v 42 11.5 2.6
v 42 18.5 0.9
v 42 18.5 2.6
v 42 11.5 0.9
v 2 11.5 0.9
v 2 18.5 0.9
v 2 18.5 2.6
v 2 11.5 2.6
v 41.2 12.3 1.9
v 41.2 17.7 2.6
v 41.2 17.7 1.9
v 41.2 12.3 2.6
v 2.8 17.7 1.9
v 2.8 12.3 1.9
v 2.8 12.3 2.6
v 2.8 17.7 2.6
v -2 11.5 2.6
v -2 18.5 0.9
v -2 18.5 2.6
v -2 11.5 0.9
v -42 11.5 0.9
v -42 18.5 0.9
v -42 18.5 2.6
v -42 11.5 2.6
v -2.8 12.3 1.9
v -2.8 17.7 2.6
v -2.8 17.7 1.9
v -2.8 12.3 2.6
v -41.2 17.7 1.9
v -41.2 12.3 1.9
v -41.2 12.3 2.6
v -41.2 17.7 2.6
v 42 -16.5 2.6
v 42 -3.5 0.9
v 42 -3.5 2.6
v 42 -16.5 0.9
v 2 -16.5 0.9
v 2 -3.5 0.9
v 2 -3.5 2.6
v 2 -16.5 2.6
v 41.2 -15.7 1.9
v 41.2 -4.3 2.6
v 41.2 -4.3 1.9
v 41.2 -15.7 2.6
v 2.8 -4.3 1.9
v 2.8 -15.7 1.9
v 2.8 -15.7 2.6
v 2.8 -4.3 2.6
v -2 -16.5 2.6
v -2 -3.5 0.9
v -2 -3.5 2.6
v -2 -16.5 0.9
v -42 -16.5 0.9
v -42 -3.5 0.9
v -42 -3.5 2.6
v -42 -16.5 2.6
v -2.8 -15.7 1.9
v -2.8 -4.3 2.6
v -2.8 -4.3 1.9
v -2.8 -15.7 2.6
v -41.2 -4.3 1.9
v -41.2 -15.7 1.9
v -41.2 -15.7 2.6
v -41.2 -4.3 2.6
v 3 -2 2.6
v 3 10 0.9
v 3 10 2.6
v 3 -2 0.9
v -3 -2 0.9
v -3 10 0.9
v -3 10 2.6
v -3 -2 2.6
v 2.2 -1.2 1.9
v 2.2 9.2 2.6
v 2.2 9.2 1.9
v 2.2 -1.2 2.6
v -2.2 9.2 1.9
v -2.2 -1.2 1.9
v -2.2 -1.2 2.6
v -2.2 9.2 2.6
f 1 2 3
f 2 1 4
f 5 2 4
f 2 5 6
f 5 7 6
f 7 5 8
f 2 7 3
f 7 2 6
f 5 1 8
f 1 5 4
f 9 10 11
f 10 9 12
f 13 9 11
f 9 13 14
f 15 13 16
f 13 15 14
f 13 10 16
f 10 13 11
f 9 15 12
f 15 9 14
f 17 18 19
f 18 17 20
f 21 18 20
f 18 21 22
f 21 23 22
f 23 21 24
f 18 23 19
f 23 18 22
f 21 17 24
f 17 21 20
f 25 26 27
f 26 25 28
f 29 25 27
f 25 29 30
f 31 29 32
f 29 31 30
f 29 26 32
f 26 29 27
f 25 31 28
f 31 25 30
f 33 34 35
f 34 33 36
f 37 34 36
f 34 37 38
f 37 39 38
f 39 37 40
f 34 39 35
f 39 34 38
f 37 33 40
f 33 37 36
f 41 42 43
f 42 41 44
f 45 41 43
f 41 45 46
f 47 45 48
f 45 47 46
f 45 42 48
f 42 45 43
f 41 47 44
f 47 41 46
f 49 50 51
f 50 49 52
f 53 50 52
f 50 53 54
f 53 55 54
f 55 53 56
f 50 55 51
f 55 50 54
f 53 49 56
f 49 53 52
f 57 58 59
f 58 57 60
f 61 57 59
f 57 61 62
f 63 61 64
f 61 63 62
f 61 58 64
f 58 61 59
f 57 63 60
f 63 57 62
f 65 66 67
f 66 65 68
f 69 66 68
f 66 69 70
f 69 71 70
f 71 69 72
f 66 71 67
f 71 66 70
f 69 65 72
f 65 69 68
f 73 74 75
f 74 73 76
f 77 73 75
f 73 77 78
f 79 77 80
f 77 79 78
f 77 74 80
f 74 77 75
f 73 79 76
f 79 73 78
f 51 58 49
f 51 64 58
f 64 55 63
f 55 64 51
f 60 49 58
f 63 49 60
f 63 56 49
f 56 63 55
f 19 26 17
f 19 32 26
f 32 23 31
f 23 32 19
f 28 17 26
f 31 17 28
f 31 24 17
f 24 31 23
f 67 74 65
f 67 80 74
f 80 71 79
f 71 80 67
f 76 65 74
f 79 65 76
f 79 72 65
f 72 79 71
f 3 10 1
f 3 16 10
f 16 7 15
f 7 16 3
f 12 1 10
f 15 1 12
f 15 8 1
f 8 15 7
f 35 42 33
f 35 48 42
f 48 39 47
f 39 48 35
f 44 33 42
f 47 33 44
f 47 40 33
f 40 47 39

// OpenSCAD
baseLength = 90;
baseWidth = 65;
baseHeight = 2.6;
baseCorner = 1;
figureStandHeight = 1;
grassHeight = 0.7;

sabotLength = 60;
sabotWidth = 40;
sabotHeight = 2.2;

sabotTolerance = 0.5;
diceSize = 8;

module noise() {
    scale([1.0 / 100.0, 1.0 / 100.0, 1.0 / 100.0]) surface(file = "Noise.png", center = true, invert = false);
};

module firepower() {
    scale([1.0 / 100.0, 1.0 / 100.0, 1.0 / 100.0]) surface(file = "Firepower.png", center = true, invert = false);
};

module baseShape(length = baseLength, width = baseWidth, height = baseHeight) {
    union() {
            
        translate([0, 0, height / 2]) cube([length, width, height], center = true);
        translate([0, 0, height]) scale([length, width, grassHeight]) noise();
    };

};

module cylindricalRect(length = baseLength, width = baseWidth, height = 1, cornerRadius = baseCorner) {

    cx = length / 2 - cornerRadius;
    cy = width / 2 - cornerRadius;
    cl = length - 2 * cornerRadius;
    cw = width - 2 * cornerRadius;
    
    scale([1, 1, 1]) union() {
        translate([cx, cy, 0]) cylinder(h = height, r = cornerRadius, $fn = 72);
        translate([-cx, cy, 0]) cylinder(h = height, r = cornerRadius, $fn = 72);
        translate([cx, -cy, 0]) cylinder(h = height, r = cornerRadius, $fn = 72);
        translate([-cx, -cy, 0]) cylinder(h = height, r = cornerRadius, $fn = 72);
        translate([0, 0, height / 2]) cube([length, 2 * cy, height], center = true);
        translate([0, 0, height / 2]) cube([2 * cx, width, height], center = true);
    };
};

module infoBar() {
    // Info bar
    infoOffY = 1 - (baseWidth - diceSize) / 2;
    infoLength = baseLength - 15 - diceSize;
    
    translate([-6 + (baseLength - infoLength) / 2, infoOffY, baseHeight - 1]) sabot(length = infoLength, width = diceSize, cutout = true);
    
    // Dice
    translate([6 - (baseLength - diceSize) / 2, infoOffY, 1]) sabot(length = diceSize, width = diceSize, cutout = true);
};

module sabot(length = sabotLength, width = sabotWidth, height = 2 * sabotHeight, cutout = false, filled = false) {

	if (cutout) {
		tolerance = sabotTolerance;
		translate([0, 0, height / 2]) cube([length + tolerance, width + tolerance, height], center = true);
	} else {
        border = 0.8;

		translate([0, 0, height / 2]) difference() {
    		cube([length, width, height], center = true);

    		if (!filled) {
            	translate([0, 0, 1]) cube([length - 2 * border, width - 2 * border, height], center = true);
            };
    	};
    };
};

module sabotsFrenchInfantryWithArty(tolerance = 0, cutouts = true) {
            
    skirmishLineY = 21;
    mainLineY = 3.5;
    commanderLineY = -15;
    
    difference() {
        union() {

            if (cutouts) {
                sabot(length = 80, width = 20, offX = 0, offY = mainLineY, tolerance = tolerance);
            } else {
                // Infantry
                sabot(length = 30, width = 20, offX = 30, offY = mainLineY, tolerance = tolerance);
                sabot(length = 30, width = 20, offX = -30, offY = mainLineY, tolerance = tolerance);
            
                // Artillery
                sabot(length = 20, width = 20, offX = 0, offY = mainLineY, tolerance = tolerance);
            };
            
            // Skirmishers
            sabot(length = 30, width = 9, offX = 25, offY = skirmishLineY, tolerance = tolerance);
            sabot(length = 30, width = 9, offX = -25, offY = skirmishLineY, tolerance = tolerance);
            
            // Commander
            sabot(length = 10, width = 12, offX = 0, offY = commanderLineY, tolerance = tolerance);
            
            if (cutouts) {
                infoBar(tolerance = tolerance);
            };
        };
        
        if (!cutouts) {
            
            border = 0.8;
            translate([0, 0, 1]) union() {
                
                // Skirmishers
                sabot(length = 30 - 2 * border, width = 9 - 2 * border, offX = 25, offY = skirmishLineY, tolerance = tolerance);
                sabot(length = 30 - 2 * border, width = 9 - 2 * border, offX = -25, offY = skirmishLineY, tolerance = tolerance);
                
                // Infantry
                sabot(length = 30 - 2 * border, width = 20 - 2 * border, offX = 30, offY = mainLineY, tolerance = tolerance);
                sabot(length = 30 - 2 * border, width = 20 - 2 * border, offX = -30, offY = mainLineY, tolerance = tolerance);
            
                // Artillery
                sabot(length = 20 - 2 * border, width = 20 - 2 * border, offX = 0, offY = mainLineY, tolerance = tolerance);
            
                // Commander
                sabot(length = 10 - 2 * border, width = 12 - 2 * border, offX = 0, offY = commanderLineY, tolerance = tolerance);

            };
        };
    };
};

module sabotsFrenchInfantry(tolerance = 0, cutouts = true) {
            
    skirmishLineY = 16;
    mainLineY = -5;
    commanderLineY = -4;
    spacingX = 23;
    
    difference() {
        union() {

            sabot(length = 30, width = 20, offX = spacingX, offY = mainLineY, tolerance = tolerance);
            sabot(length = 30, width = 20, offX = -spacingX, offY = mainLineY, tolerance = tolerance);
            
            // Skirmishers
            sabot(length = 30, width = 9, offX = spacingX, offY = skirmishLineY, tolerance = tolerance);
            sabot(length = 30, width = 9, offX = -spacingX, offY = skirmishLineY, tolerance = tolerance);
            
            // Commander
            sabot(length = 10, width = 12, offX = 0, offY = commanderLineY, tolerance = tolerance);
            
            if (cutouts) {
                infoBar(tolerance = tolerance);
            };
        };
        
        if (!cutouts) {
            border = 0.8;
            translate([0, 0, 1]) union() {
                
                // Skirmishers
                sabot(length = 30 - 2 * border, width = 9 - 2 * border, offX = spacingX, offY = skirmishLineY, tolerance = tolerance);
                sabot(length = 30 - 2 * border, width = 9 - 2 * border, offX = -spacingX, offY = skirmishLineY, tolerance = tolerance);
                
                // Infantry
                sabot(length = 30 - 2 * border, width = 20 - 2 * border, offX = spacingX, offY = mainLineY, tolerance = tolerance);
                sabot(length = 30 - 2 * border, width = 20 - 2 * border, offX = -spacingX, offY = mainLineY, tolerance = tolerance);
            
                // Commander
                sabot(length = 10 - 2 * border, width = 12 - 2 * border, offX = 0, offY = commanderLineY, tolerance = tolerance);

            };
        };
    };
};

module sabotsCavalry(tolerance = 0, cutouts = true) {
  cavalryWidth = 30;
  cavalryDepth = 15;  
    
  commanderLineY = 7;
  firstLineY = 10;
  secondLineY = -10;
  spacingX = 22;
   
  difference() {
      union() {

          sabot(length = cavalryWidth, width = cavalryDepth, offX = spacingX, offY = firstLineY, tolerance = tolerance);
          sabot(length = cavalryWidth, width = cavalryDepth, offX = -spacingX, offY = firstLineY, tolerance = tolerance);
          sabot(length = cavalryWidth, width = cavalryDepth, offX = spacingX, offY = secondLineY, tolerance = tolerance);
          sabot(length = cavalryWidth, width = cavalryDepth, offX = -spacingX, offY = secondLineY, tolerance = tolerance);

          sabot(length = 10, width = cavalryDepth, offX = 0, offY = commanderLineY, tolerance = tolerance);
            
          if (cutouts) {
              infoBar(tolerance = tolerance);
          };
      };
        
      if (!cutouts) {
          border = 0.8;
          translate([0, 0, 1]) union() {
                
              sabot(length = cavalryWidth - 2 * border, width = cavalryDepth - 2 * border, offX = spacingX, offY = firstLineY, tolerance = tolerance);
              sabot(length = cavalryWidth - 2 * border, width = cavalryDepth - 2 * border, offX = -spacingX, offY = firstLineY, tolerance = tolerance);
              sabot(length = cavalryWidth - 2 * border, width = cavalryDepth - 2 * border, offX = spacingX, offY = secondLineY, tolerance = tolerance);
              sabot(length = cavalryWidth - 2 * border, width = cavalryDepth - 2 * border, offX = -spacingX, offY = secondLineY, tolerance = tolerance);
                
              sabot(length = 10 - 2 * border, width = cavalryDepth - 2 * border, offX = 0, offY = commanderLineY, tolerance = tolerance);
          };
      };
    };
};

module sabotsArtillery(tolerance = 0, cutouts = true) {
    
  mainLineY = 5;
  spacingX = 30;
   
  difference() {
      union() {

          sabot(length = 20, width = 20, offX = 0, offY = mainLineY, tolerance = tolerance);
          sabot(length = 20, width = 20, offX = -spacingX, offY = mainLineY, tolerance = tolerance);
          sabot(length = 20, width = 20, offX = spacingX, offY = mainLineY, tolerance = tolerance);

          if (cutouts) {
              infoBar(tolerance = tolerance);
          };
      };
        
      if (!cutouts) {
          border = 0.8;
          translate([0, 0, 1]) union() {
                
            sabot(length = 20 - 2 * border, width = 20 - 2 * border, offX = 0, offY = mainLineY, tolerance = tolerance);
            sabot(length = 20 - 2 * border, width = 20 - 2 * border, offX = -spacingX, offY = mainLineY, tolerance = tolerance);
            sabot(length = 20 - 2 * border, width = 20 - 2 * border, offX = spacingX, offY = mainLineY, tolerance = tolerance);

          };
      };
    };
};

module sabotsBritishInfantryWithArty(tolerance = 0, cutouts = true) {
              
    skirmishLineY = 22;
    mainLineY = 6.5;
    commanderLineY = -10;
    sideX = 22.5;

    union() {
            
        // Skirmishers
        translate([sideX, skirmishLineY, 0]) sabot(length = 40, width = 7, cutout = cutout, filled = filled);
        translate([-sideX, skirmishLineY, 0]) sabot(length = 40, width = 7, cutout = cutout, filled = filled);

        // Infantry
        translate([sideX, mainLineY, 0]) sabot(length = 40, width = 13, cutout = cutout, filled = filled);
        translate([-sideX, mainLineY, 0]) sabot(length = 40, width = 13, cutout = cutout, filled = filled);
            
        // Artillery
        translate([8, commanderLineY - 2, 0]) sabot(length = 20, width = 20, cutout = cutout, filled = filled);
            
        // Commander
        translate([-10, commanderLineY, 0]) sabot(length = 8, width = 12, cutout = cutout, filled = filled);
        
    };
};

module sabotsBritishInfantry(cutout = false, filled = false) {
  
/*              
    skirmishLineY = 20;
    mainLineY = 2;
    commanderLineY = -14;
    sideX = 22.5;
*/
/**/
    skirmishLineY = 15;
    mainLineY = -10;
    commanderLineY = 4;
    sideX = 22;
/**/
    union() {
            
        // Skirmishers
        translate([sideX, skirmishLineY, 0]) sabot(length = 40, width = 7, cutout = cutout, filled = filled);
        translate([-sideX, skirmishLineY, 0]) sabot(length = 40, width = 7, cutout = cutout, filled = filled);

        // Infantry
        translate([sideX, mainLineY, 0]) sabot(length = 40, width = 13, cutout = cutout, filled = filled);
        translate([-sideX, mainLineY, 0]) sabot(length = 40, width = 13, cutout = cutout, filled = filled);
            
        // Commander
        translate([0, commanderLineY, 0]) sabot(length = 6, width = 12, cutout = cutout, filled = filled);
        
    };
};

module centreMarking(length = 5, width = 1.5, height = 0.0 + grassHeight) {
    translate([0, (baseWidth - length) / 2, baseHeight + height / 2]) cube([width, length, height], center = true);
};

module angleMarkings(length = 7, width = 1.5, height = 0.0 + grassHeight) {
    translate([baseLength / 2, baseWidth / 2, baseHeight + height / 2]) rotate(a = -45) translate([0, -length / 2, 0]) cube([width, length, height], center = true);
    translate([-baseLength / 2, baseWidth / 2, baseHeight + height / 2]) rotate(a = 45) translate([0, -length / 2, 0]) cube([width, length, height], center = true);
};

union() {
/**
    intersection() {
        union() {
            difference() {
                baseShape();

                union() {
            		infoBar(tolerance = 0);
                	translate([0, 0, baseHeight - sabotHeight]) sabotsBritishInfantry(cutout = true);
//                translate([0, 0, baseHeight - sabotHeight]) sabotsBritishInfantryWithArty(cutout = true);
//                translate([0, 0, baseHeight - sabotHeight]) sabotsFrenchInfantryWithArty(tolerance = sabotTolerance);
//                translate([0, 0, baseHeight - sabotHeight]) sabotsFrenchInfantry(tolerance = sabotTolerance);
//                translate([0, 0, baseHeight - sabotHeight]) sabotsCavalry(tolerance = sabotTolerance);
//                translate([0, 0, baseHeight - sabotHeight]) sabotsArtillery(tolerance = sabotTolerance);
                };

            };
            
            centreMarking();
            angleMarkings();

            //translate([38, -19, 0.0]) scale([6, 6, baseHeight + grassHeight]) firepower();
        };
        
        scale([1, 1, 20]) translate([0, 0, -0.5]) cylindricalRect();

    };
**/
/**/
    intersection() {
        baseShape();
        translate([0, 0, baseHeight - sabotHeight + 0.5]) sabotsBritishInfantry(cutout = false, filled = false);
//        translate([0, 0, baseHeight - sabotHeight + 0.5]) sabotsBritishInfantryWithArty(cutout = false, filled = false);

//        translate([0, 0, baseHeight - sabotHeight + 0.5]) sabotsFrenchInfantryWithArty(cutouts = false);
//        translate([0, 0, baseHeight - sabotHeight + 0.5]) sabotsFrenchInfantry(cutouts = false);
//        translate([0, 0, baseHeight - sabotHeight + 0.5]) sabotsCavalry(cutouts = false);
//        translate([0, 0, baseHeight - sabotHeight + 0.5]) sabotsArtillery(cutouts = false);
     };
/**/
};
